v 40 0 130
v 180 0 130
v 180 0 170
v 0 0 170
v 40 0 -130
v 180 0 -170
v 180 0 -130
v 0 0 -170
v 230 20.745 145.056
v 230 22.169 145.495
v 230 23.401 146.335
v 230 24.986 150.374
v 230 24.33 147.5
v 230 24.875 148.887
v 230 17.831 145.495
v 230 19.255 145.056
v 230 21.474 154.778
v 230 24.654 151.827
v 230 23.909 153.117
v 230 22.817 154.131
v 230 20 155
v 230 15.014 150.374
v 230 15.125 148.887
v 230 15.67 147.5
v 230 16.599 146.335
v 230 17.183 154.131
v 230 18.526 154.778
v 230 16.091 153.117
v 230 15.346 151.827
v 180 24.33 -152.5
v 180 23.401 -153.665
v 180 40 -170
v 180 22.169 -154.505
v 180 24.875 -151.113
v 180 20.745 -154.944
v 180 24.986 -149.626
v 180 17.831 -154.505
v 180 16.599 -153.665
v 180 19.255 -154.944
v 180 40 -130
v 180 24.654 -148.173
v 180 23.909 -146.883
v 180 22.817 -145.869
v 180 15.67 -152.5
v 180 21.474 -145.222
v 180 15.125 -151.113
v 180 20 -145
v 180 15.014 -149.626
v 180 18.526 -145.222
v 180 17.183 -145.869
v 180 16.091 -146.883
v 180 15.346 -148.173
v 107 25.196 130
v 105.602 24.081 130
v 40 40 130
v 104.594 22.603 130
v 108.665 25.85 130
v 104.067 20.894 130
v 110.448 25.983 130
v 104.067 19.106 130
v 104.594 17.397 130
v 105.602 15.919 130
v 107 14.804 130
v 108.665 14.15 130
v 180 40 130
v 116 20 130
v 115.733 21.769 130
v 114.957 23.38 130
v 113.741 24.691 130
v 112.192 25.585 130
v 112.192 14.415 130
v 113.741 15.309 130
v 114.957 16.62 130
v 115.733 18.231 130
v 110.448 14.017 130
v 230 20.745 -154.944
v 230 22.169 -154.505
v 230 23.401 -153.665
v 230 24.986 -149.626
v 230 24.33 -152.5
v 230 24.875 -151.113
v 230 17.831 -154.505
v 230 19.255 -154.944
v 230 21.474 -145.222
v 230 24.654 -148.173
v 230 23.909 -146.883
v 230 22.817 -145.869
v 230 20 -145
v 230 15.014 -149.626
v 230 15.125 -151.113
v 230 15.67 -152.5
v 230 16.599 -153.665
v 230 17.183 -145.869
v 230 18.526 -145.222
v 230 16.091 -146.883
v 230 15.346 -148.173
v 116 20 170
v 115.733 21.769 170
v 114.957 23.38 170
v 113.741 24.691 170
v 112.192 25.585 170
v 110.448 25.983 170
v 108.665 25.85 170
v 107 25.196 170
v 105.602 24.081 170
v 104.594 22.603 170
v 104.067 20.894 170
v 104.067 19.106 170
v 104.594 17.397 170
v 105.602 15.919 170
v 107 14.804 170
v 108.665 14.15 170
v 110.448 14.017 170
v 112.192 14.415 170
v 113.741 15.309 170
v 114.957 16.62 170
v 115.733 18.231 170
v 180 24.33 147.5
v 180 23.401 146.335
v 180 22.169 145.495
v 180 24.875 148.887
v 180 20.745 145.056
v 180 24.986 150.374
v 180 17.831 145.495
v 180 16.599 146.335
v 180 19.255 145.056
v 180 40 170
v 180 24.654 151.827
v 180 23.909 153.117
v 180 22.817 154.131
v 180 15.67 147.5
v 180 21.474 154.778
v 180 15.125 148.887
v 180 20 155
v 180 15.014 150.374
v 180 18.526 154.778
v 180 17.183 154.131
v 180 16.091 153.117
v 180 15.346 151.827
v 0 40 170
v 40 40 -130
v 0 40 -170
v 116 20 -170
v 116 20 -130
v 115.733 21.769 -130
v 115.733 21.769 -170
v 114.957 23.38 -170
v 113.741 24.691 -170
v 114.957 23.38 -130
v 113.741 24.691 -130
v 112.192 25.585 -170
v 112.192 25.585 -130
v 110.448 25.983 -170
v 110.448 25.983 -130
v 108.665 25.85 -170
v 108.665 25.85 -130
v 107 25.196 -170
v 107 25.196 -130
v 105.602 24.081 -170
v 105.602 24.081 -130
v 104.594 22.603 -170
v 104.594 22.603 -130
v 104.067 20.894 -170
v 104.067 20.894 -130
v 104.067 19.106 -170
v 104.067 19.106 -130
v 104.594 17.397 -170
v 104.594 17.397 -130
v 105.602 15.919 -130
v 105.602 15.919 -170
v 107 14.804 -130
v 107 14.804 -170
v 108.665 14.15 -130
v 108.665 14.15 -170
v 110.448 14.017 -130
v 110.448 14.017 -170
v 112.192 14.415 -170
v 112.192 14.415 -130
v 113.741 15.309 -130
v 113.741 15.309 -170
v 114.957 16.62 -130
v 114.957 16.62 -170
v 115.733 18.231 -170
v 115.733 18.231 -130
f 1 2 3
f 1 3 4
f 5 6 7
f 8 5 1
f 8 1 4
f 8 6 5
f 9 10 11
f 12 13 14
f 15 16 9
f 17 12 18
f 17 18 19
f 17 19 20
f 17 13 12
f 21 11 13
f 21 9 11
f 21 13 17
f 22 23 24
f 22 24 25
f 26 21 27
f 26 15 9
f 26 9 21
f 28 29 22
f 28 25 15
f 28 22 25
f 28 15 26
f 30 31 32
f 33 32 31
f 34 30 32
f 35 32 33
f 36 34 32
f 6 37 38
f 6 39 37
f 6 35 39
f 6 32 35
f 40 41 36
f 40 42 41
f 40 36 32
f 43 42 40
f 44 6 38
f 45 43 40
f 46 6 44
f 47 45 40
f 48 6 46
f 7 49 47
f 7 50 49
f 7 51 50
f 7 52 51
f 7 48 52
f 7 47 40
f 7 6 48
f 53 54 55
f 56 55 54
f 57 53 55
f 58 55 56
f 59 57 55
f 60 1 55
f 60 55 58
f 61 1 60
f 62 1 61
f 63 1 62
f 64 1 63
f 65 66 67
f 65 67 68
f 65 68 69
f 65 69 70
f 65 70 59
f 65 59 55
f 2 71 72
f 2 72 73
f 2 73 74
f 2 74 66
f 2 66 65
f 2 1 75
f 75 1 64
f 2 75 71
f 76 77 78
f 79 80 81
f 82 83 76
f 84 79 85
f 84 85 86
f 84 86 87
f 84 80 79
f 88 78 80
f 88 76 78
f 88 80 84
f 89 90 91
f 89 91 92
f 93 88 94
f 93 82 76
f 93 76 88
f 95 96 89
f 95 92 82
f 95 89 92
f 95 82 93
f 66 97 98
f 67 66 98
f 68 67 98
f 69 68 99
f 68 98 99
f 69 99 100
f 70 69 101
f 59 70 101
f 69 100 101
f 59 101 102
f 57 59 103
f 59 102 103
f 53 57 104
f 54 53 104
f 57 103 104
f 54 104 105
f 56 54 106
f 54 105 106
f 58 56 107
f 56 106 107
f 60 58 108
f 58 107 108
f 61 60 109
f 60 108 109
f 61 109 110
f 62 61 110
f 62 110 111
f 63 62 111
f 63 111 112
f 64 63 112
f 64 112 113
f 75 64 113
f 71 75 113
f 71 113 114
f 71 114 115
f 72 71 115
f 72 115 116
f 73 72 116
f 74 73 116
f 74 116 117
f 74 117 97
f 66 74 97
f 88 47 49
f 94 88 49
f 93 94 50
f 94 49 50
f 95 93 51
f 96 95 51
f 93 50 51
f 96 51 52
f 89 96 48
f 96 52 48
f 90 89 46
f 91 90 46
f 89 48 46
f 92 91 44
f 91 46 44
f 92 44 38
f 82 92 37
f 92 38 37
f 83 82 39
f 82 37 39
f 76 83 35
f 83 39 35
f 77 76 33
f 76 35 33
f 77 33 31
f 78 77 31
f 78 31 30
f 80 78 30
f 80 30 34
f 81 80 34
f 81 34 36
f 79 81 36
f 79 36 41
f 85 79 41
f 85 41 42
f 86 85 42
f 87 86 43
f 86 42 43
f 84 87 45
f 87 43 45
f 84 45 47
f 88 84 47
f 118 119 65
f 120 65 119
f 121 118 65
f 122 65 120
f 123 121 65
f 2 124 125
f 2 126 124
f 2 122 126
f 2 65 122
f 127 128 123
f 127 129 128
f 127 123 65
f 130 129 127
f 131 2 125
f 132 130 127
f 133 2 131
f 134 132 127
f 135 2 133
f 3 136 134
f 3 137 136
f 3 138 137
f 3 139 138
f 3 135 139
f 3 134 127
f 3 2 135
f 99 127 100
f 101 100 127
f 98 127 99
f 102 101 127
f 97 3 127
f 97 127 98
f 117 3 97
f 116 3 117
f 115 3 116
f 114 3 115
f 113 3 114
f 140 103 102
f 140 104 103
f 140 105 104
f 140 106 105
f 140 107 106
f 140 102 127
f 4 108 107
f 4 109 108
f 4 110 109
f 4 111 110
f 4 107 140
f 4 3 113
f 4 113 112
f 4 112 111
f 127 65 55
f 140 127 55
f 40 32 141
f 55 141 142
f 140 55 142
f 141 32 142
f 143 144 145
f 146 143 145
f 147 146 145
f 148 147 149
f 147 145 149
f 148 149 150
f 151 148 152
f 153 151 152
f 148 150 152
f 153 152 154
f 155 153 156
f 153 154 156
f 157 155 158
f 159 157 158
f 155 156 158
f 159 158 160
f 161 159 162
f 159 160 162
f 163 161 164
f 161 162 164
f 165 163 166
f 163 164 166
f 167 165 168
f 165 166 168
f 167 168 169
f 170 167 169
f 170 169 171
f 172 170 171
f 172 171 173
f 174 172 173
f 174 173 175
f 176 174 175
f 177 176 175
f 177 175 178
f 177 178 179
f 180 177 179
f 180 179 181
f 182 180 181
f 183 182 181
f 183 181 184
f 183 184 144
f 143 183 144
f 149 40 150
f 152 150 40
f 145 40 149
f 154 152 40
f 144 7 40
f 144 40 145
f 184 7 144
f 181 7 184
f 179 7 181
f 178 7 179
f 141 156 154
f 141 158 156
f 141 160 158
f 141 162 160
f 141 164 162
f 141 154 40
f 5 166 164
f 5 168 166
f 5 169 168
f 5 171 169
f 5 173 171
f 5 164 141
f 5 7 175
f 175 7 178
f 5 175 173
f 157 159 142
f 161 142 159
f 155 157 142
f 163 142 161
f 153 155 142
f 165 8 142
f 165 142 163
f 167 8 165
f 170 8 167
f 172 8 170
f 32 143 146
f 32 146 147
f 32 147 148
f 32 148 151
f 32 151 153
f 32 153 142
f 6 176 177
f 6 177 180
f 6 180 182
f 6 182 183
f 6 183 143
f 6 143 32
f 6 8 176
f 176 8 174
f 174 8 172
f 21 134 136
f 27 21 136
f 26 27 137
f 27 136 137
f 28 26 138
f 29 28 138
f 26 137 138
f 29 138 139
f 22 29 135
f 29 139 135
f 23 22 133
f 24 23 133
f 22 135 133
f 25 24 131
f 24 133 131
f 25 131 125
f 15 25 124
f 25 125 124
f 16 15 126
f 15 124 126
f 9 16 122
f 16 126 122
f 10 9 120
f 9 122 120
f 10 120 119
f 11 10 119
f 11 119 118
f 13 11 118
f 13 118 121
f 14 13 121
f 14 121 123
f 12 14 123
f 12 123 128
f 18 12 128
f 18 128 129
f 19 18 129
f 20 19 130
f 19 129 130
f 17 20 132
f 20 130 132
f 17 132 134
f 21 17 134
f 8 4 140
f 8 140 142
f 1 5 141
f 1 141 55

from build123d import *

# Parameters (mm, degrees)
BOSS_EXTRUDE1_DEPTH = 40
SKETCH2_R           = 6
CUT_EXTRUDE1_DEPTH  = 395
SKETCH3_R           = 5
BOSS_EXTRUDE2_DEPTH = 50


with BuildPart() as part:
    # Sketch1 → Boss-Extrude1 (new body)
    with BuildSketch(Plane(origin=(0, 0, 0), x_dir=(1, 0, 0), z_dir=(0, 1, 0))):
        Polygon((0, 170), (180, 170), (180, 130), (40, 130), (40, -130), (180, -130), (180, -170), (0, -170), align=None)
    extrude(amount=BOSS_EXTRUDE1_DEPTH)

    # Sketch2 → Cut-Extrude1 (cut)
    with BuildSketch(Plane.XY.offset(170)):
        with Locations((110, 20)):
            Circle(SKETCH2_R)
    extrude(amount=-CUT_EXTRUDE1_DEPTH, mode=Mode.SUBTRACT)

    # Sketch3 → Boss-Extrude2 (add)
    with BuildSketch(Plane(origin=(180, 0, 0), x_dir=(0, 0, -1), z_dir=(1, 0, 0))):
        with Locations(Location((-150, 20, 0), (0, 0, 180))):
            Circle(SKETCH3_R)
        with Locations(Location((150, 20, 0), (0, 0, 180))):
            Circle(SKETCH3_R)
    extrude(amount=BOSS_EXTRUDE2_DEPTH)


solid = part.part
